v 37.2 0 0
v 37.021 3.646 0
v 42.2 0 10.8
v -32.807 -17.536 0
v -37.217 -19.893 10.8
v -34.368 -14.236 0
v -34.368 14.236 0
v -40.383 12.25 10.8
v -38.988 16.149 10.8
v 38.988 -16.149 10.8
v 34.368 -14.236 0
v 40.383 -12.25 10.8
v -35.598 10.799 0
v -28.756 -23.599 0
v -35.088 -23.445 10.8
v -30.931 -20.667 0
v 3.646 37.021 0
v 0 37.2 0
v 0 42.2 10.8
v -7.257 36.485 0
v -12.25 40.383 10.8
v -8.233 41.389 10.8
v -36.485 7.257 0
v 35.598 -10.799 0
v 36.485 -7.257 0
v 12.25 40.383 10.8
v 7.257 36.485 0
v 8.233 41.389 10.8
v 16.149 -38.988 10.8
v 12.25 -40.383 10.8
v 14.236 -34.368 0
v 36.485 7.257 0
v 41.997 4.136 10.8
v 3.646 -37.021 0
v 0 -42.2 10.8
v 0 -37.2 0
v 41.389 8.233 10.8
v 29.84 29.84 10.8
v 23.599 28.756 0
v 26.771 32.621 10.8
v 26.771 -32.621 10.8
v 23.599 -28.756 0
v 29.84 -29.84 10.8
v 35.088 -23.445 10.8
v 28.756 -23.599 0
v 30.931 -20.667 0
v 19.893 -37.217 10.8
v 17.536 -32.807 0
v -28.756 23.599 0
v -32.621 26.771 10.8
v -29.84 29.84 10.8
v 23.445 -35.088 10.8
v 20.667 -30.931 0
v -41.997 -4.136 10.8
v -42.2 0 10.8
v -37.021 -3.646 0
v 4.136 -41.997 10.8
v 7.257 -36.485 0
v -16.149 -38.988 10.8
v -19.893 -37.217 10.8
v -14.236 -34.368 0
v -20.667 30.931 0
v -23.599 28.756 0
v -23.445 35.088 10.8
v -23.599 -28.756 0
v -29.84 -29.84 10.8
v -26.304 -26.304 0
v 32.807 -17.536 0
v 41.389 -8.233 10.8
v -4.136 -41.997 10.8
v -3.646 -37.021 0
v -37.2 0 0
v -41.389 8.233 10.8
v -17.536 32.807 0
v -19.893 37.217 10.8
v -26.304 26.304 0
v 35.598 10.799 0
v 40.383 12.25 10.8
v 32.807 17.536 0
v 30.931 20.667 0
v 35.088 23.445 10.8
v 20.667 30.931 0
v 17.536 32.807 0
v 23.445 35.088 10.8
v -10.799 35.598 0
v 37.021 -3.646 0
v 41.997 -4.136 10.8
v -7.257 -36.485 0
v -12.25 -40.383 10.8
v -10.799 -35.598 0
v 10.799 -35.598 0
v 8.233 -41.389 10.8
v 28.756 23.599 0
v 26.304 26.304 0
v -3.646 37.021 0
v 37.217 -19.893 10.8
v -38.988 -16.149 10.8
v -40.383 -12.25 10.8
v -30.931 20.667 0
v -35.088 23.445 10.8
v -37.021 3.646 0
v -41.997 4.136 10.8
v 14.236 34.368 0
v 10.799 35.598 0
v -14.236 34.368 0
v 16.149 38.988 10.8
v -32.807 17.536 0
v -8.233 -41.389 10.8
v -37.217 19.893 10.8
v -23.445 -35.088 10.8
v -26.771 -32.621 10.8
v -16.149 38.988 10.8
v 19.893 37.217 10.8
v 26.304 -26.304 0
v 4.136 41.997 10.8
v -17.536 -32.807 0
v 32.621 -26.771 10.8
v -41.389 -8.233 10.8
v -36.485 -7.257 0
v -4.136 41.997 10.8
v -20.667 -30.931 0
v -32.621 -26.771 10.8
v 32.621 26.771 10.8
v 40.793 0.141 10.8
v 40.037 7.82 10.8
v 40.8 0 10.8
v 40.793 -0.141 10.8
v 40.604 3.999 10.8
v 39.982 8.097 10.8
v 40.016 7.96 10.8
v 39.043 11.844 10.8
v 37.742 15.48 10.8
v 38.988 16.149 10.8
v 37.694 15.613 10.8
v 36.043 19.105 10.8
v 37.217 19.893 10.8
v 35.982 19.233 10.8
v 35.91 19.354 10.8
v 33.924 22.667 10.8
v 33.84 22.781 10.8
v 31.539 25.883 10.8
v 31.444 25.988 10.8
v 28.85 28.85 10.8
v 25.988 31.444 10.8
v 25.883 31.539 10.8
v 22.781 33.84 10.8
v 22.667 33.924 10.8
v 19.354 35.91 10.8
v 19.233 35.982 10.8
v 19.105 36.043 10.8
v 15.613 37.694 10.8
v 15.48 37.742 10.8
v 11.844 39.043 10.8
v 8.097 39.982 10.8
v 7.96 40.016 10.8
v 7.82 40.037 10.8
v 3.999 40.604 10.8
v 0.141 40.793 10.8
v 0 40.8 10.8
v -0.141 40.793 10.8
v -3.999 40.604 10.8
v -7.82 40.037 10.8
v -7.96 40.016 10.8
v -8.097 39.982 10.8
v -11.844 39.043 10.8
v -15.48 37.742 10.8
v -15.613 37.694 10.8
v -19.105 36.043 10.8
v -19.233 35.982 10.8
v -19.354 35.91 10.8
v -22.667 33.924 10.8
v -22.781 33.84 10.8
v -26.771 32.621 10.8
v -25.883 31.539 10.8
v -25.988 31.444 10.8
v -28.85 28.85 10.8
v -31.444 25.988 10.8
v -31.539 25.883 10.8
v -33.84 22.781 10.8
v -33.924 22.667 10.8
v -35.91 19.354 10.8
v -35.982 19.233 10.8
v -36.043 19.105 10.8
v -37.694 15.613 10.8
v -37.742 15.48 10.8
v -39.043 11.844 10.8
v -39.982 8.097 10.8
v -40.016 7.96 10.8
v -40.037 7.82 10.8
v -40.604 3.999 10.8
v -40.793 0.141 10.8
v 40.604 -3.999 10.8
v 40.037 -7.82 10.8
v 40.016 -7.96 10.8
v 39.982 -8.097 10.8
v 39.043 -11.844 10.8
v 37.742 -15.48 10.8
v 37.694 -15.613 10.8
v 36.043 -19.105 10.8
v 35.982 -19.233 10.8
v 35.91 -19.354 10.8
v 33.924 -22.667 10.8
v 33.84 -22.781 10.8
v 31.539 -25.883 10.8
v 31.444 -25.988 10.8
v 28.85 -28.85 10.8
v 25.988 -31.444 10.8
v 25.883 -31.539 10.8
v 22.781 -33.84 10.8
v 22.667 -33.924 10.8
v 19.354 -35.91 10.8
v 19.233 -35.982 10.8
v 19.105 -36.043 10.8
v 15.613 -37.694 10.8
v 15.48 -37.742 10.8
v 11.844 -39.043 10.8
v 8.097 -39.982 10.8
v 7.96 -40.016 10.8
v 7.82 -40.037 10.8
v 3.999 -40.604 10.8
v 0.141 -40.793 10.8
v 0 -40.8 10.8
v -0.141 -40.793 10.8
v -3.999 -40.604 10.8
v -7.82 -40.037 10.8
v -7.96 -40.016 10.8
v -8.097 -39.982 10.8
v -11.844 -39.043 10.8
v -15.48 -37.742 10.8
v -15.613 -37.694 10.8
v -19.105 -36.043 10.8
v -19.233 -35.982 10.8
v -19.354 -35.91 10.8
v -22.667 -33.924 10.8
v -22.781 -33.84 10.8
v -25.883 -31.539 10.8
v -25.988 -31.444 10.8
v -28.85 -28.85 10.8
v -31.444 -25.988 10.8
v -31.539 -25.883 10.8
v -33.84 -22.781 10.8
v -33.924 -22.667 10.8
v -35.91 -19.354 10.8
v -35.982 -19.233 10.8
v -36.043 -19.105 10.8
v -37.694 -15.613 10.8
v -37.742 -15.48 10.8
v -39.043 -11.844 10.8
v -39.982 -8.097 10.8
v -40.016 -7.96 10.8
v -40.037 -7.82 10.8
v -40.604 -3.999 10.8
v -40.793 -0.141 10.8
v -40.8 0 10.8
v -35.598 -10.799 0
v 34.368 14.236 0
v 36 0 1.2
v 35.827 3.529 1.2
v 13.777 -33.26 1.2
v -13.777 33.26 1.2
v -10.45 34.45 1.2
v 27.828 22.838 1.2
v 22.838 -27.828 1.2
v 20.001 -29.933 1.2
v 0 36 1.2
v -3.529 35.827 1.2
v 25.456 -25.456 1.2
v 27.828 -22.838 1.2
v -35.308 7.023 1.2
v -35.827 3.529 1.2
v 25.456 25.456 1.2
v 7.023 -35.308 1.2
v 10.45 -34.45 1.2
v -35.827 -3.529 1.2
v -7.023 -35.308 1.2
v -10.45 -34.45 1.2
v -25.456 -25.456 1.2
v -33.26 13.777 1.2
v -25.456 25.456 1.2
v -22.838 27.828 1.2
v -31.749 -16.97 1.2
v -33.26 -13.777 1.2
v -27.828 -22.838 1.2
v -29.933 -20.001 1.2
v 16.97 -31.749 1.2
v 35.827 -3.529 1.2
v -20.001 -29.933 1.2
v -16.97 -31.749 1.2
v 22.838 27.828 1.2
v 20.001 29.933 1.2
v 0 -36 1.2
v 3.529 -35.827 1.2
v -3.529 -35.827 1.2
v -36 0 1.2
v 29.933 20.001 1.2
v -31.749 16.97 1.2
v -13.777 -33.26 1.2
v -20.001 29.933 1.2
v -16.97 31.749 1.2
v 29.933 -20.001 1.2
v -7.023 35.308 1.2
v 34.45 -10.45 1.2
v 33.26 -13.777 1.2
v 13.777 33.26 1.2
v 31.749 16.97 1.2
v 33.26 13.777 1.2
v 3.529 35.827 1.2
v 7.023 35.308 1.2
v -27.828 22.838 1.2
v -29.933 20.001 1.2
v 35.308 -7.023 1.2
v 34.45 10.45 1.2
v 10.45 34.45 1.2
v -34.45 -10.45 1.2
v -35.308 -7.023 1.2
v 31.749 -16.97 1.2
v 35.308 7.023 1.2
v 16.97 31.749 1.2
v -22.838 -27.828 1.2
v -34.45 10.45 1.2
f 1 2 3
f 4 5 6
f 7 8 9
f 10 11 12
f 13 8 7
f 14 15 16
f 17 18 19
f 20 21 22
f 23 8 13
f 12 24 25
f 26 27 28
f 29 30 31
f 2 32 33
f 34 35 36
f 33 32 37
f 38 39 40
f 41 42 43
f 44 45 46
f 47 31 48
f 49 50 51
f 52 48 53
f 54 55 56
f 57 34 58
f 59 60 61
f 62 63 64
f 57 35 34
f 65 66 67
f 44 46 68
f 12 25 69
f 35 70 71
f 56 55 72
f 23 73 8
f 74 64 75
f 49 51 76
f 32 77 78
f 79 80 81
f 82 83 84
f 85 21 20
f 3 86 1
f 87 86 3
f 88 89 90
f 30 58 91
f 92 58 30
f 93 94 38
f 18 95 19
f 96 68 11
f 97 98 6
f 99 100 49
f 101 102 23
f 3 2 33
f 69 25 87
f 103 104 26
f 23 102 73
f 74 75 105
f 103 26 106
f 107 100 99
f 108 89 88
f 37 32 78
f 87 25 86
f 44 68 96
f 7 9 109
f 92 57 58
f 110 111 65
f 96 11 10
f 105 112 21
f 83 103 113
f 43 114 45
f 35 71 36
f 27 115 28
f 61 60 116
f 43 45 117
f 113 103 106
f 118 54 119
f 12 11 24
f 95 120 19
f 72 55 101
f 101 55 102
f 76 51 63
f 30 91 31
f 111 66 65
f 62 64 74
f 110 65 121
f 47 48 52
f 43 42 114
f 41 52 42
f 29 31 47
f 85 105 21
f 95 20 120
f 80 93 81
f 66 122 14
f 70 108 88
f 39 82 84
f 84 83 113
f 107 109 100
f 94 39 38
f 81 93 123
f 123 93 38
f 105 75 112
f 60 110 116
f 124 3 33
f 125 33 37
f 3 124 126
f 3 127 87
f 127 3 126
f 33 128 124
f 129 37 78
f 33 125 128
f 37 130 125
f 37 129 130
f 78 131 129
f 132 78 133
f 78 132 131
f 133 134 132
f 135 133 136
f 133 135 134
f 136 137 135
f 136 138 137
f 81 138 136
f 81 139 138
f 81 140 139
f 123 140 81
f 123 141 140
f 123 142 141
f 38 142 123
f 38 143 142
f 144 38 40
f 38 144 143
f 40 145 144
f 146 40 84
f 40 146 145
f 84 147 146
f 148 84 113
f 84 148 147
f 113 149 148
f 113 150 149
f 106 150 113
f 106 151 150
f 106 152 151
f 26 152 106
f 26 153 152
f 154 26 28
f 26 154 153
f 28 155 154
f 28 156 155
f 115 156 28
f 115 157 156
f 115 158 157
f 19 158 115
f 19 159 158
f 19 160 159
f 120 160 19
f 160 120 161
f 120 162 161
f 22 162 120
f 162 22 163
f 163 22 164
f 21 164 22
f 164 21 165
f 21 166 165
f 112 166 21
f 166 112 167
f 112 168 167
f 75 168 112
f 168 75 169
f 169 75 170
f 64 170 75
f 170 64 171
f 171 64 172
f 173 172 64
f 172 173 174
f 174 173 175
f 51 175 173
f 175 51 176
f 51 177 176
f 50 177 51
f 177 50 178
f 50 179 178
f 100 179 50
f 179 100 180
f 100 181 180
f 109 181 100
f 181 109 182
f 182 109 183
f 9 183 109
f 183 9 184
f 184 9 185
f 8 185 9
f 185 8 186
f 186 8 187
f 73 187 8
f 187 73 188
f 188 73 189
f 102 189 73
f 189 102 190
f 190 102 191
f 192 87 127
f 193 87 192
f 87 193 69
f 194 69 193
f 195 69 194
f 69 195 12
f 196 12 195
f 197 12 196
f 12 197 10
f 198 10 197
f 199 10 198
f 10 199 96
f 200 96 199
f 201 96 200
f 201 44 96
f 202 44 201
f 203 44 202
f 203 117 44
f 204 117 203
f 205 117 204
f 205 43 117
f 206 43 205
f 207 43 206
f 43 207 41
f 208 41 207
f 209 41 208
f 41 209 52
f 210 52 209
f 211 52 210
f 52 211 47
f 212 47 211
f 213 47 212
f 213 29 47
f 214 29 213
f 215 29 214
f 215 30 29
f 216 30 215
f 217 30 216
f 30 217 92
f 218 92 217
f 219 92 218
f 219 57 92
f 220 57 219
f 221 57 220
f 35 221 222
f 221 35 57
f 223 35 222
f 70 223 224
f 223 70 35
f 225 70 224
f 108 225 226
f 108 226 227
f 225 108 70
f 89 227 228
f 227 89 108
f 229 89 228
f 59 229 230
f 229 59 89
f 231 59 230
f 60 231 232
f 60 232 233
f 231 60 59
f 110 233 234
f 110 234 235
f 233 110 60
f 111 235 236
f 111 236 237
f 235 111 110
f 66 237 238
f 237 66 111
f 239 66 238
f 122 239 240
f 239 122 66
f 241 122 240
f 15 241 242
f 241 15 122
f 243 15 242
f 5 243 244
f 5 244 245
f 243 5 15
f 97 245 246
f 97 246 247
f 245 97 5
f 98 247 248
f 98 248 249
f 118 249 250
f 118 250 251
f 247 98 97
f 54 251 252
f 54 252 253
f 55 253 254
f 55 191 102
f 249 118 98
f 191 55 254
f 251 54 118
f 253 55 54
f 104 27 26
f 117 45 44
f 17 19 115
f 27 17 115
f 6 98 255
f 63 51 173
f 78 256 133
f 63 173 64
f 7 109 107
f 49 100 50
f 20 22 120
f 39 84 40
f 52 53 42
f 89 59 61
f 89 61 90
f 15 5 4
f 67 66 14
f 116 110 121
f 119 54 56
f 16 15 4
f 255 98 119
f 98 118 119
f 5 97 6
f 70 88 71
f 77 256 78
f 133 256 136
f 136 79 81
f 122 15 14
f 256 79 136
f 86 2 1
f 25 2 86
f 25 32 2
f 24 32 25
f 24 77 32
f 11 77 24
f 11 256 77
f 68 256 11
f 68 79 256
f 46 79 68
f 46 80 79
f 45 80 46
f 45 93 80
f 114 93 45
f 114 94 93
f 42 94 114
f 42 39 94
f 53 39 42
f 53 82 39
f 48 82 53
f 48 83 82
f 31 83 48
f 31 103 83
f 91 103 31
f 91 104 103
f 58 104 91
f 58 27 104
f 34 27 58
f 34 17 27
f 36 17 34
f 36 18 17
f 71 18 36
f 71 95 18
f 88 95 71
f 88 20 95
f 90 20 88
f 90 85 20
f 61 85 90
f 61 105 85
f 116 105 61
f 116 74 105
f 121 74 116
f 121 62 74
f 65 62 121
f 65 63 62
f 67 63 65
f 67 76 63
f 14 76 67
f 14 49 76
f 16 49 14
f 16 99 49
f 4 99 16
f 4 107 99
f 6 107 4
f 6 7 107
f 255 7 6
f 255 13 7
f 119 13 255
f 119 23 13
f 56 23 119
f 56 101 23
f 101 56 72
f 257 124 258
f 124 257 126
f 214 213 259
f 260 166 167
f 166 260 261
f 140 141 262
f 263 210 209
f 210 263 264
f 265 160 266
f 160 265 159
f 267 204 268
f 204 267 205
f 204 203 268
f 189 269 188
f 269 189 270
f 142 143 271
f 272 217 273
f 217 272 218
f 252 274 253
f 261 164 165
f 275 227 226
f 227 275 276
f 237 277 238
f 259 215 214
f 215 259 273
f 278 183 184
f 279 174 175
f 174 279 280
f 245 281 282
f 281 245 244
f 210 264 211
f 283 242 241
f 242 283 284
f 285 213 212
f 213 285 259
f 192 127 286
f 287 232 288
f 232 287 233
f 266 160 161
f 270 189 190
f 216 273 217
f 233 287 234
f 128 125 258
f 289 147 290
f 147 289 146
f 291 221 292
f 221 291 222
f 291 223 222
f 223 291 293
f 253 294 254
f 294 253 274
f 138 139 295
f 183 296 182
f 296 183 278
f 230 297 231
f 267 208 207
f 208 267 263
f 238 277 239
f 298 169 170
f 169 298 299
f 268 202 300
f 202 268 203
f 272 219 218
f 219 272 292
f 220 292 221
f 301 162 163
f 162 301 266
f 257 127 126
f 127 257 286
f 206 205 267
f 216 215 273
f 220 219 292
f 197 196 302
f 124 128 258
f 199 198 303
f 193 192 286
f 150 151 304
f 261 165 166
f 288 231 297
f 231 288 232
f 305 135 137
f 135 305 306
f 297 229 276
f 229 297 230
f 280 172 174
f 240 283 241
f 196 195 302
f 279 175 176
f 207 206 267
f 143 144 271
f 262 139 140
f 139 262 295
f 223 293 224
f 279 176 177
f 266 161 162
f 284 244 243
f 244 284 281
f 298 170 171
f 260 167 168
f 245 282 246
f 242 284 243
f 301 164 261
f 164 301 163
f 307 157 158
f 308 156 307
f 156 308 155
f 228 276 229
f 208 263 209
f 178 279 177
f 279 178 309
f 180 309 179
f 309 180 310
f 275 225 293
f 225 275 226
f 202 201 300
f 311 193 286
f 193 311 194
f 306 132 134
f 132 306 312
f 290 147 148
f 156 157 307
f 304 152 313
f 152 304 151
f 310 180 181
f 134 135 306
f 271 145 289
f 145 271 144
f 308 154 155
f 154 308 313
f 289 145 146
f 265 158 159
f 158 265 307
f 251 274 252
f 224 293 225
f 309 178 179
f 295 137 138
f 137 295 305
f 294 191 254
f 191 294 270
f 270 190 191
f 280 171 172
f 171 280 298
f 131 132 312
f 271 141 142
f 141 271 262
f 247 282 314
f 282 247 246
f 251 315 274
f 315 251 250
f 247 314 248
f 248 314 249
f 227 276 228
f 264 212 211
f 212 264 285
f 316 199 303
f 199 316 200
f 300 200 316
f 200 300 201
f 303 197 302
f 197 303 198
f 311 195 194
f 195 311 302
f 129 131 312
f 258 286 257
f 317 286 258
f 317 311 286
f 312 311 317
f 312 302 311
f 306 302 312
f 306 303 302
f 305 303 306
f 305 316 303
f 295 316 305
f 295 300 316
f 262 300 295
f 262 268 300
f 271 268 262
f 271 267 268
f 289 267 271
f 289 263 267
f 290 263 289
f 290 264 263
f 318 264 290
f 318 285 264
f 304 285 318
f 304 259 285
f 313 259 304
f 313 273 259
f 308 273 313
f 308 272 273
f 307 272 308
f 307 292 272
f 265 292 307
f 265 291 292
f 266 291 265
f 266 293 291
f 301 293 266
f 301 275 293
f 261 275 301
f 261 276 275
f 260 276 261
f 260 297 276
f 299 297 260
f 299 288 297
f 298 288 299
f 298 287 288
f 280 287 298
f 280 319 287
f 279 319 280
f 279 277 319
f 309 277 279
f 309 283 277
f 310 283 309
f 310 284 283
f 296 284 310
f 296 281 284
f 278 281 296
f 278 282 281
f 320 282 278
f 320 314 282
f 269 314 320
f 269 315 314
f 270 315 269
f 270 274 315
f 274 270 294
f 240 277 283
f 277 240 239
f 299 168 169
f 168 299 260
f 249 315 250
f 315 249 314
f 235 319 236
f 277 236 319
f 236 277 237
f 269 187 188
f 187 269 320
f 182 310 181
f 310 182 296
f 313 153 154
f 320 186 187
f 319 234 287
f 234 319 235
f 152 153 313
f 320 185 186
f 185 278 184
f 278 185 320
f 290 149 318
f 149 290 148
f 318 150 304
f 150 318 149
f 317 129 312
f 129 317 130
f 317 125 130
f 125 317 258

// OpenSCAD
$fn=64;

height = 10;
width = 72;

thicknes = 1.2;
bottom = 0.8;
top_addition = 5;

difference() {
    cylinder(h=height+bottom, r=(width/2) + thicknes, r2=(width/2) + thicknes + top_addition);
    translate([0, 0, thicknes])
    cylinder(h=height, r=(width/2), r2=(width/2) + top_addition);
}
